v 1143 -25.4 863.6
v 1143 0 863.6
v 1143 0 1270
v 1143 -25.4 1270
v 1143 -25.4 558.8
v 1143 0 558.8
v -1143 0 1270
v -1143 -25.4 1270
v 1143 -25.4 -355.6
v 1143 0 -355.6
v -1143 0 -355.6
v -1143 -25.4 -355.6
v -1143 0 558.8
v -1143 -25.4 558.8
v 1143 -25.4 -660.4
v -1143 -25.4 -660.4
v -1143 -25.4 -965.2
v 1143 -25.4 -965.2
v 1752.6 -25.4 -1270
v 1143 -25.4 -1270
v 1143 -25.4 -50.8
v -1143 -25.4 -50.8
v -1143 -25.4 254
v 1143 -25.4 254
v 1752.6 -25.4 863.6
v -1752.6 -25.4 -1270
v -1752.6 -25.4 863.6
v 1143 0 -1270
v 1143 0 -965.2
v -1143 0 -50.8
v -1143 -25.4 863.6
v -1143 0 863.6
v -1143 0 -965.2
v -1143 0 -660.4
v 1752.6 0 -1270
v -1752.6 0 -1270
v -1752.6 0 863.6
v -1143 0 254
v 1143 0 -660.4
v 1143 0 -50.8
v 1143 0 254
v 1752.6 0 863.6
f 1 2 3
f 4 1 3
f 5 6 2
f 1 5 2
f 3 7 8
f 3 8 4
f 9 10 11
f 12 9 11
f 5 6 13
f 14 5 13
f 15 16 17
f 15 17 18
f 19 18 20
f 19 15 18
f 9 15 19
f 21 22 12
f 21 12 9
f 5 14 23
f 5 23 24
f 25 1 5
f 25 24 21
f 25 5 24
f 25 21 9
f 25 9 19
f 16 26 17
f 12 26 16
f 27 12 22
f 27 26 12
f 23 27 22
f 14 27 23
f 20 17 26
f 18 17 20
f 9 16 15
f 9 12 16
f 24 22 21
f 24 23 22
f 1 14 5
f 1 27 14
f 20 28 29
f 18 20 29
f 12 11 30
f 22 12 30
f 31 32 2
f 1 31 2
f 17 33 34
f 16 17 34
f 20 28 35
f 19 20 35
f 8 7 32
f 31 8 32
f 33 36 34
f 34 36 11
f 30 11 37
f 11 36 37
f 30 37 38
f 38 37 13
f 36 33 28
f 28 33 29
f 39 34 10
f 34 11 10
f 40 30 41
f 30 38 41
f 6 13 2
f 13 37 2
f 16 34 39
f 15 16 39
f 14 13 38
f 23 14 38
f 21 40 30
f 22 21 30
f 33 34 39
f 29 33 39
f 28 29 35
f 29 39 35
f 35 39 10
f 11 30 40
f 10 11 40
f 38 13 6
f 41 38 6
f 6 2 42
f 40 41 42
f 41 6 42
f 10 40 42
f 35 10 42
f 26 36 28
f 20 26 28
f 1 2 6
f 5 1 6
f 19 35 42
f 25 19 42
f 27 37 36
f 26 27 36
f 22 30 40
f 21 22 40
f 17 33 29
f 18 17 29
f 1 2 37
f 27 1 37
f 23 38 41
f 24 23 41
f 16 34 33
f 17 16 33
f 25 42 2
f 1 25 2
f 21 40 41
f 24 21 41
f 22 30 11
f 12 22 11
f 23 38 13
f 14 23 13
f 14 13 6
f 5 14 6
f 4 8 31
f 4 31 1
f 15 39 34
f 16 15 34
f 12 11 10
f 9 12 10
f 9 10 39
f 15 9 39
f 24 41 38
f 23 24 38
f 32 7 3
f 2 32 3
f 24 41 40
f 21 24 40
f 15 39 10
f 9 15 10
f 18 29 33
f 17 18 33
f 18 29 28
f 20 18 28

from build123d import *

# Parameters (mm, degrees)
F0_W     = 914.4
F0_H     = 177.8
F0_H_2   = 279.4
F0_W_2   = 685.8
F0_H_3   = 25.4
F1_DEPTH = 25.4
F2_DEPTH = 25.4
F0_W_3   = 2286
F0_H_4   = 101.6
F3_DEPTH = 25.4


with BuildPart() as f1:
    # F0 (on Front) → F1 (new body)
    with BuildSketch(Plane.XZ):
        Polygon((1143, 584.2), (1143, 863.6), (-1143, 863.6), (-1752.6, 863.6), (-1752.6, -1270), (-1143, -1270), (-1143, -1244.6), (-457.2, -1244.6), (-457.2, -965.2), (-1143, -965.2), (-1143, -939.8), (-1143, -660.4), (-1143, -635), (-457.2, -635), (-457.2, -355.6), (-1143, -355.6), (-1143, -330.2), (-1143, -50.8), (-1143, -25.4), (-457.2, -25.4), (-457.2, 254), (-1143, 254), (-1143, 279.4), (-1143, 558.8), (-1143, 584.2), (-457.2, 584.2), (-457.2, 762), (457.2, 762), (457.2, 584.2), align=None)
        with Locations((0, 673.1)):
            Rectangle(F0_W, F0_H)
        with Locations((0, 114.3)):
            Rectangle(F0_W, F0_H_2)
        with Locations((800.1, 114.3)):
            Rectangle(F0_W_2, F0_H_2)
        with Locations((0, -495.3)):
            Rectangle(F0_W, F0_H_2)
        with Locations((800.1, -495.3)):
            Rectangle(F0_W_2, F0_H_2)
        with Locations((0, -1104.9)):
            Rectangle(F0_W, F0_H_2)
        with Locations((800.1, -1104.9)):
            Rectangle(F0_W_2, F0_H_2)
        with Locations((-800.1, -1257.3)):
            Rectangle(F0_W_2, F0_H_3)
        with Locations((0, -1257.3)):
            Rectangle(F0_W, F0_H_3)
        with Locations((800.1, -1257.3)):
            Rectangle(F0_W_2, F0_H_3)
        with Locations((-800.1, -647.7)):
            Rectangle(F0_W_2, F0_H_3)
        with Locations((0, -647.7)):
            Rectangle(F0_W, F0_H_3)
        with Locations((800.1, -647.7)):
            Rectangle(F0_W_2, F0_H_3)
        with Locations((-800.1, -38.1)):
            Rectangle(F0_W_2, F0_H_3)
        with Locations((0, -38.1)):
            Rectangle(F0_W, F0_H_3)
        with Locations((800.1, -38.1)):
            Rectangle(F0_W_2, F0_H_3)
        with Locations((-800.1, 571.5)):
            Rectangle(F0_W_2, F0_H_3)
        with Locations((0, 571.5)):
            Rectangle(F0_W, F0_H_3)
        with Locations((800.1, 571.5)):
            Rectangle(F0_W_2, F0_H_3)
    extrude(amount=F1_DEPTH)


with BuildPart() as f2:
    # F0 (on Front) → F2 (new body)
    with BuildSketch(Plane.XZ):
        Polygon((1752.6, 863.6), (1143, 863.6), (1143, 584.2), (1143, 558.8), (457.2, 558.8), (457.2, 279.4), (1143, 279.4), (1143, 254), (1143, -25.4), (1143, -50.8), (457.2, -50.8), (457.2, -330.2), (1143, -330.2), (1143, -355.6), (1143, -635), (1143, -660.4), (457.2, -660.4), (457.2, -939.8), (1143, -939.8), (1143, -965.2), (1143, -1244.6), (1143, -1270), (1752.6, -1270), align=None)
        with Locations((0, 419.1)):
            Rectangle(F0_W, F0_H_2)
        with Locations((-800.1, 419.1)):
            Rectangle(F0_W_2, F0_H_2)
        with Locations((-800.1, -190.5)):
            Rectangle(F0_W_2, F0_H_2)
        with Locations((0, -190.5)):
            Rectangle(F0_W, F0_H_2)
        with Locations((-800.1, -800.1)):
            Rectangle(F0_W_2, F0_H_2)
        with Locations((0, -800.1)):
            Rectangle(F0_W, F0_H_2)
        with Locations((-800.1, 266.7)):
            Rectangle(F0_W_2, F0_H_3)
        with Locations((0, 266.7)):
            Rectangle(F0_W, F0_H_3)
        with Locations((800.1, 266.7)):
            Rectangle(F0_W_2, F0_H_3)
        with Locations((-800.1, -342.9)):
            Rectangle(F0_W_2, F0_H_3)
        with Locations((0, -342.9)):
            Rectangle(F0_W, F0_H_3)
        with Locations((800.1, -342.9)):
            Rectangle(F0_W_2, F0_H_3)
        with Locations((-800.1, -952.5)):
            Rectangle(F0_W_2, F0_H_3)
        with Locations((0, -952.5)):
            Rectangle(F0_W, F0_H_3)
        with Locations((800.1, -952.5)):
            Rectangle(F0_W_2, F0_H_3)
    extrude(amount=F2_DEPTH)


with BuildPart() as f3:
    # F0 (on Front) → F3 (new body)
    with BuildSketch(Plane.XZ):
        with Locations((0, 1028.7)):
            Rectangle(F0_W_3, F0_H_2)
        with Locations((0, 1219.2)):
            Rectangle(F0_W_3, F0_H_4)
        with Locations((0, 876.3)):
            Rectangle(F0_W_3, F0_H_3)
    extrude(amount=F3_DEPTH)


solid = Compound([f1.part, f2.part, f3.part])
